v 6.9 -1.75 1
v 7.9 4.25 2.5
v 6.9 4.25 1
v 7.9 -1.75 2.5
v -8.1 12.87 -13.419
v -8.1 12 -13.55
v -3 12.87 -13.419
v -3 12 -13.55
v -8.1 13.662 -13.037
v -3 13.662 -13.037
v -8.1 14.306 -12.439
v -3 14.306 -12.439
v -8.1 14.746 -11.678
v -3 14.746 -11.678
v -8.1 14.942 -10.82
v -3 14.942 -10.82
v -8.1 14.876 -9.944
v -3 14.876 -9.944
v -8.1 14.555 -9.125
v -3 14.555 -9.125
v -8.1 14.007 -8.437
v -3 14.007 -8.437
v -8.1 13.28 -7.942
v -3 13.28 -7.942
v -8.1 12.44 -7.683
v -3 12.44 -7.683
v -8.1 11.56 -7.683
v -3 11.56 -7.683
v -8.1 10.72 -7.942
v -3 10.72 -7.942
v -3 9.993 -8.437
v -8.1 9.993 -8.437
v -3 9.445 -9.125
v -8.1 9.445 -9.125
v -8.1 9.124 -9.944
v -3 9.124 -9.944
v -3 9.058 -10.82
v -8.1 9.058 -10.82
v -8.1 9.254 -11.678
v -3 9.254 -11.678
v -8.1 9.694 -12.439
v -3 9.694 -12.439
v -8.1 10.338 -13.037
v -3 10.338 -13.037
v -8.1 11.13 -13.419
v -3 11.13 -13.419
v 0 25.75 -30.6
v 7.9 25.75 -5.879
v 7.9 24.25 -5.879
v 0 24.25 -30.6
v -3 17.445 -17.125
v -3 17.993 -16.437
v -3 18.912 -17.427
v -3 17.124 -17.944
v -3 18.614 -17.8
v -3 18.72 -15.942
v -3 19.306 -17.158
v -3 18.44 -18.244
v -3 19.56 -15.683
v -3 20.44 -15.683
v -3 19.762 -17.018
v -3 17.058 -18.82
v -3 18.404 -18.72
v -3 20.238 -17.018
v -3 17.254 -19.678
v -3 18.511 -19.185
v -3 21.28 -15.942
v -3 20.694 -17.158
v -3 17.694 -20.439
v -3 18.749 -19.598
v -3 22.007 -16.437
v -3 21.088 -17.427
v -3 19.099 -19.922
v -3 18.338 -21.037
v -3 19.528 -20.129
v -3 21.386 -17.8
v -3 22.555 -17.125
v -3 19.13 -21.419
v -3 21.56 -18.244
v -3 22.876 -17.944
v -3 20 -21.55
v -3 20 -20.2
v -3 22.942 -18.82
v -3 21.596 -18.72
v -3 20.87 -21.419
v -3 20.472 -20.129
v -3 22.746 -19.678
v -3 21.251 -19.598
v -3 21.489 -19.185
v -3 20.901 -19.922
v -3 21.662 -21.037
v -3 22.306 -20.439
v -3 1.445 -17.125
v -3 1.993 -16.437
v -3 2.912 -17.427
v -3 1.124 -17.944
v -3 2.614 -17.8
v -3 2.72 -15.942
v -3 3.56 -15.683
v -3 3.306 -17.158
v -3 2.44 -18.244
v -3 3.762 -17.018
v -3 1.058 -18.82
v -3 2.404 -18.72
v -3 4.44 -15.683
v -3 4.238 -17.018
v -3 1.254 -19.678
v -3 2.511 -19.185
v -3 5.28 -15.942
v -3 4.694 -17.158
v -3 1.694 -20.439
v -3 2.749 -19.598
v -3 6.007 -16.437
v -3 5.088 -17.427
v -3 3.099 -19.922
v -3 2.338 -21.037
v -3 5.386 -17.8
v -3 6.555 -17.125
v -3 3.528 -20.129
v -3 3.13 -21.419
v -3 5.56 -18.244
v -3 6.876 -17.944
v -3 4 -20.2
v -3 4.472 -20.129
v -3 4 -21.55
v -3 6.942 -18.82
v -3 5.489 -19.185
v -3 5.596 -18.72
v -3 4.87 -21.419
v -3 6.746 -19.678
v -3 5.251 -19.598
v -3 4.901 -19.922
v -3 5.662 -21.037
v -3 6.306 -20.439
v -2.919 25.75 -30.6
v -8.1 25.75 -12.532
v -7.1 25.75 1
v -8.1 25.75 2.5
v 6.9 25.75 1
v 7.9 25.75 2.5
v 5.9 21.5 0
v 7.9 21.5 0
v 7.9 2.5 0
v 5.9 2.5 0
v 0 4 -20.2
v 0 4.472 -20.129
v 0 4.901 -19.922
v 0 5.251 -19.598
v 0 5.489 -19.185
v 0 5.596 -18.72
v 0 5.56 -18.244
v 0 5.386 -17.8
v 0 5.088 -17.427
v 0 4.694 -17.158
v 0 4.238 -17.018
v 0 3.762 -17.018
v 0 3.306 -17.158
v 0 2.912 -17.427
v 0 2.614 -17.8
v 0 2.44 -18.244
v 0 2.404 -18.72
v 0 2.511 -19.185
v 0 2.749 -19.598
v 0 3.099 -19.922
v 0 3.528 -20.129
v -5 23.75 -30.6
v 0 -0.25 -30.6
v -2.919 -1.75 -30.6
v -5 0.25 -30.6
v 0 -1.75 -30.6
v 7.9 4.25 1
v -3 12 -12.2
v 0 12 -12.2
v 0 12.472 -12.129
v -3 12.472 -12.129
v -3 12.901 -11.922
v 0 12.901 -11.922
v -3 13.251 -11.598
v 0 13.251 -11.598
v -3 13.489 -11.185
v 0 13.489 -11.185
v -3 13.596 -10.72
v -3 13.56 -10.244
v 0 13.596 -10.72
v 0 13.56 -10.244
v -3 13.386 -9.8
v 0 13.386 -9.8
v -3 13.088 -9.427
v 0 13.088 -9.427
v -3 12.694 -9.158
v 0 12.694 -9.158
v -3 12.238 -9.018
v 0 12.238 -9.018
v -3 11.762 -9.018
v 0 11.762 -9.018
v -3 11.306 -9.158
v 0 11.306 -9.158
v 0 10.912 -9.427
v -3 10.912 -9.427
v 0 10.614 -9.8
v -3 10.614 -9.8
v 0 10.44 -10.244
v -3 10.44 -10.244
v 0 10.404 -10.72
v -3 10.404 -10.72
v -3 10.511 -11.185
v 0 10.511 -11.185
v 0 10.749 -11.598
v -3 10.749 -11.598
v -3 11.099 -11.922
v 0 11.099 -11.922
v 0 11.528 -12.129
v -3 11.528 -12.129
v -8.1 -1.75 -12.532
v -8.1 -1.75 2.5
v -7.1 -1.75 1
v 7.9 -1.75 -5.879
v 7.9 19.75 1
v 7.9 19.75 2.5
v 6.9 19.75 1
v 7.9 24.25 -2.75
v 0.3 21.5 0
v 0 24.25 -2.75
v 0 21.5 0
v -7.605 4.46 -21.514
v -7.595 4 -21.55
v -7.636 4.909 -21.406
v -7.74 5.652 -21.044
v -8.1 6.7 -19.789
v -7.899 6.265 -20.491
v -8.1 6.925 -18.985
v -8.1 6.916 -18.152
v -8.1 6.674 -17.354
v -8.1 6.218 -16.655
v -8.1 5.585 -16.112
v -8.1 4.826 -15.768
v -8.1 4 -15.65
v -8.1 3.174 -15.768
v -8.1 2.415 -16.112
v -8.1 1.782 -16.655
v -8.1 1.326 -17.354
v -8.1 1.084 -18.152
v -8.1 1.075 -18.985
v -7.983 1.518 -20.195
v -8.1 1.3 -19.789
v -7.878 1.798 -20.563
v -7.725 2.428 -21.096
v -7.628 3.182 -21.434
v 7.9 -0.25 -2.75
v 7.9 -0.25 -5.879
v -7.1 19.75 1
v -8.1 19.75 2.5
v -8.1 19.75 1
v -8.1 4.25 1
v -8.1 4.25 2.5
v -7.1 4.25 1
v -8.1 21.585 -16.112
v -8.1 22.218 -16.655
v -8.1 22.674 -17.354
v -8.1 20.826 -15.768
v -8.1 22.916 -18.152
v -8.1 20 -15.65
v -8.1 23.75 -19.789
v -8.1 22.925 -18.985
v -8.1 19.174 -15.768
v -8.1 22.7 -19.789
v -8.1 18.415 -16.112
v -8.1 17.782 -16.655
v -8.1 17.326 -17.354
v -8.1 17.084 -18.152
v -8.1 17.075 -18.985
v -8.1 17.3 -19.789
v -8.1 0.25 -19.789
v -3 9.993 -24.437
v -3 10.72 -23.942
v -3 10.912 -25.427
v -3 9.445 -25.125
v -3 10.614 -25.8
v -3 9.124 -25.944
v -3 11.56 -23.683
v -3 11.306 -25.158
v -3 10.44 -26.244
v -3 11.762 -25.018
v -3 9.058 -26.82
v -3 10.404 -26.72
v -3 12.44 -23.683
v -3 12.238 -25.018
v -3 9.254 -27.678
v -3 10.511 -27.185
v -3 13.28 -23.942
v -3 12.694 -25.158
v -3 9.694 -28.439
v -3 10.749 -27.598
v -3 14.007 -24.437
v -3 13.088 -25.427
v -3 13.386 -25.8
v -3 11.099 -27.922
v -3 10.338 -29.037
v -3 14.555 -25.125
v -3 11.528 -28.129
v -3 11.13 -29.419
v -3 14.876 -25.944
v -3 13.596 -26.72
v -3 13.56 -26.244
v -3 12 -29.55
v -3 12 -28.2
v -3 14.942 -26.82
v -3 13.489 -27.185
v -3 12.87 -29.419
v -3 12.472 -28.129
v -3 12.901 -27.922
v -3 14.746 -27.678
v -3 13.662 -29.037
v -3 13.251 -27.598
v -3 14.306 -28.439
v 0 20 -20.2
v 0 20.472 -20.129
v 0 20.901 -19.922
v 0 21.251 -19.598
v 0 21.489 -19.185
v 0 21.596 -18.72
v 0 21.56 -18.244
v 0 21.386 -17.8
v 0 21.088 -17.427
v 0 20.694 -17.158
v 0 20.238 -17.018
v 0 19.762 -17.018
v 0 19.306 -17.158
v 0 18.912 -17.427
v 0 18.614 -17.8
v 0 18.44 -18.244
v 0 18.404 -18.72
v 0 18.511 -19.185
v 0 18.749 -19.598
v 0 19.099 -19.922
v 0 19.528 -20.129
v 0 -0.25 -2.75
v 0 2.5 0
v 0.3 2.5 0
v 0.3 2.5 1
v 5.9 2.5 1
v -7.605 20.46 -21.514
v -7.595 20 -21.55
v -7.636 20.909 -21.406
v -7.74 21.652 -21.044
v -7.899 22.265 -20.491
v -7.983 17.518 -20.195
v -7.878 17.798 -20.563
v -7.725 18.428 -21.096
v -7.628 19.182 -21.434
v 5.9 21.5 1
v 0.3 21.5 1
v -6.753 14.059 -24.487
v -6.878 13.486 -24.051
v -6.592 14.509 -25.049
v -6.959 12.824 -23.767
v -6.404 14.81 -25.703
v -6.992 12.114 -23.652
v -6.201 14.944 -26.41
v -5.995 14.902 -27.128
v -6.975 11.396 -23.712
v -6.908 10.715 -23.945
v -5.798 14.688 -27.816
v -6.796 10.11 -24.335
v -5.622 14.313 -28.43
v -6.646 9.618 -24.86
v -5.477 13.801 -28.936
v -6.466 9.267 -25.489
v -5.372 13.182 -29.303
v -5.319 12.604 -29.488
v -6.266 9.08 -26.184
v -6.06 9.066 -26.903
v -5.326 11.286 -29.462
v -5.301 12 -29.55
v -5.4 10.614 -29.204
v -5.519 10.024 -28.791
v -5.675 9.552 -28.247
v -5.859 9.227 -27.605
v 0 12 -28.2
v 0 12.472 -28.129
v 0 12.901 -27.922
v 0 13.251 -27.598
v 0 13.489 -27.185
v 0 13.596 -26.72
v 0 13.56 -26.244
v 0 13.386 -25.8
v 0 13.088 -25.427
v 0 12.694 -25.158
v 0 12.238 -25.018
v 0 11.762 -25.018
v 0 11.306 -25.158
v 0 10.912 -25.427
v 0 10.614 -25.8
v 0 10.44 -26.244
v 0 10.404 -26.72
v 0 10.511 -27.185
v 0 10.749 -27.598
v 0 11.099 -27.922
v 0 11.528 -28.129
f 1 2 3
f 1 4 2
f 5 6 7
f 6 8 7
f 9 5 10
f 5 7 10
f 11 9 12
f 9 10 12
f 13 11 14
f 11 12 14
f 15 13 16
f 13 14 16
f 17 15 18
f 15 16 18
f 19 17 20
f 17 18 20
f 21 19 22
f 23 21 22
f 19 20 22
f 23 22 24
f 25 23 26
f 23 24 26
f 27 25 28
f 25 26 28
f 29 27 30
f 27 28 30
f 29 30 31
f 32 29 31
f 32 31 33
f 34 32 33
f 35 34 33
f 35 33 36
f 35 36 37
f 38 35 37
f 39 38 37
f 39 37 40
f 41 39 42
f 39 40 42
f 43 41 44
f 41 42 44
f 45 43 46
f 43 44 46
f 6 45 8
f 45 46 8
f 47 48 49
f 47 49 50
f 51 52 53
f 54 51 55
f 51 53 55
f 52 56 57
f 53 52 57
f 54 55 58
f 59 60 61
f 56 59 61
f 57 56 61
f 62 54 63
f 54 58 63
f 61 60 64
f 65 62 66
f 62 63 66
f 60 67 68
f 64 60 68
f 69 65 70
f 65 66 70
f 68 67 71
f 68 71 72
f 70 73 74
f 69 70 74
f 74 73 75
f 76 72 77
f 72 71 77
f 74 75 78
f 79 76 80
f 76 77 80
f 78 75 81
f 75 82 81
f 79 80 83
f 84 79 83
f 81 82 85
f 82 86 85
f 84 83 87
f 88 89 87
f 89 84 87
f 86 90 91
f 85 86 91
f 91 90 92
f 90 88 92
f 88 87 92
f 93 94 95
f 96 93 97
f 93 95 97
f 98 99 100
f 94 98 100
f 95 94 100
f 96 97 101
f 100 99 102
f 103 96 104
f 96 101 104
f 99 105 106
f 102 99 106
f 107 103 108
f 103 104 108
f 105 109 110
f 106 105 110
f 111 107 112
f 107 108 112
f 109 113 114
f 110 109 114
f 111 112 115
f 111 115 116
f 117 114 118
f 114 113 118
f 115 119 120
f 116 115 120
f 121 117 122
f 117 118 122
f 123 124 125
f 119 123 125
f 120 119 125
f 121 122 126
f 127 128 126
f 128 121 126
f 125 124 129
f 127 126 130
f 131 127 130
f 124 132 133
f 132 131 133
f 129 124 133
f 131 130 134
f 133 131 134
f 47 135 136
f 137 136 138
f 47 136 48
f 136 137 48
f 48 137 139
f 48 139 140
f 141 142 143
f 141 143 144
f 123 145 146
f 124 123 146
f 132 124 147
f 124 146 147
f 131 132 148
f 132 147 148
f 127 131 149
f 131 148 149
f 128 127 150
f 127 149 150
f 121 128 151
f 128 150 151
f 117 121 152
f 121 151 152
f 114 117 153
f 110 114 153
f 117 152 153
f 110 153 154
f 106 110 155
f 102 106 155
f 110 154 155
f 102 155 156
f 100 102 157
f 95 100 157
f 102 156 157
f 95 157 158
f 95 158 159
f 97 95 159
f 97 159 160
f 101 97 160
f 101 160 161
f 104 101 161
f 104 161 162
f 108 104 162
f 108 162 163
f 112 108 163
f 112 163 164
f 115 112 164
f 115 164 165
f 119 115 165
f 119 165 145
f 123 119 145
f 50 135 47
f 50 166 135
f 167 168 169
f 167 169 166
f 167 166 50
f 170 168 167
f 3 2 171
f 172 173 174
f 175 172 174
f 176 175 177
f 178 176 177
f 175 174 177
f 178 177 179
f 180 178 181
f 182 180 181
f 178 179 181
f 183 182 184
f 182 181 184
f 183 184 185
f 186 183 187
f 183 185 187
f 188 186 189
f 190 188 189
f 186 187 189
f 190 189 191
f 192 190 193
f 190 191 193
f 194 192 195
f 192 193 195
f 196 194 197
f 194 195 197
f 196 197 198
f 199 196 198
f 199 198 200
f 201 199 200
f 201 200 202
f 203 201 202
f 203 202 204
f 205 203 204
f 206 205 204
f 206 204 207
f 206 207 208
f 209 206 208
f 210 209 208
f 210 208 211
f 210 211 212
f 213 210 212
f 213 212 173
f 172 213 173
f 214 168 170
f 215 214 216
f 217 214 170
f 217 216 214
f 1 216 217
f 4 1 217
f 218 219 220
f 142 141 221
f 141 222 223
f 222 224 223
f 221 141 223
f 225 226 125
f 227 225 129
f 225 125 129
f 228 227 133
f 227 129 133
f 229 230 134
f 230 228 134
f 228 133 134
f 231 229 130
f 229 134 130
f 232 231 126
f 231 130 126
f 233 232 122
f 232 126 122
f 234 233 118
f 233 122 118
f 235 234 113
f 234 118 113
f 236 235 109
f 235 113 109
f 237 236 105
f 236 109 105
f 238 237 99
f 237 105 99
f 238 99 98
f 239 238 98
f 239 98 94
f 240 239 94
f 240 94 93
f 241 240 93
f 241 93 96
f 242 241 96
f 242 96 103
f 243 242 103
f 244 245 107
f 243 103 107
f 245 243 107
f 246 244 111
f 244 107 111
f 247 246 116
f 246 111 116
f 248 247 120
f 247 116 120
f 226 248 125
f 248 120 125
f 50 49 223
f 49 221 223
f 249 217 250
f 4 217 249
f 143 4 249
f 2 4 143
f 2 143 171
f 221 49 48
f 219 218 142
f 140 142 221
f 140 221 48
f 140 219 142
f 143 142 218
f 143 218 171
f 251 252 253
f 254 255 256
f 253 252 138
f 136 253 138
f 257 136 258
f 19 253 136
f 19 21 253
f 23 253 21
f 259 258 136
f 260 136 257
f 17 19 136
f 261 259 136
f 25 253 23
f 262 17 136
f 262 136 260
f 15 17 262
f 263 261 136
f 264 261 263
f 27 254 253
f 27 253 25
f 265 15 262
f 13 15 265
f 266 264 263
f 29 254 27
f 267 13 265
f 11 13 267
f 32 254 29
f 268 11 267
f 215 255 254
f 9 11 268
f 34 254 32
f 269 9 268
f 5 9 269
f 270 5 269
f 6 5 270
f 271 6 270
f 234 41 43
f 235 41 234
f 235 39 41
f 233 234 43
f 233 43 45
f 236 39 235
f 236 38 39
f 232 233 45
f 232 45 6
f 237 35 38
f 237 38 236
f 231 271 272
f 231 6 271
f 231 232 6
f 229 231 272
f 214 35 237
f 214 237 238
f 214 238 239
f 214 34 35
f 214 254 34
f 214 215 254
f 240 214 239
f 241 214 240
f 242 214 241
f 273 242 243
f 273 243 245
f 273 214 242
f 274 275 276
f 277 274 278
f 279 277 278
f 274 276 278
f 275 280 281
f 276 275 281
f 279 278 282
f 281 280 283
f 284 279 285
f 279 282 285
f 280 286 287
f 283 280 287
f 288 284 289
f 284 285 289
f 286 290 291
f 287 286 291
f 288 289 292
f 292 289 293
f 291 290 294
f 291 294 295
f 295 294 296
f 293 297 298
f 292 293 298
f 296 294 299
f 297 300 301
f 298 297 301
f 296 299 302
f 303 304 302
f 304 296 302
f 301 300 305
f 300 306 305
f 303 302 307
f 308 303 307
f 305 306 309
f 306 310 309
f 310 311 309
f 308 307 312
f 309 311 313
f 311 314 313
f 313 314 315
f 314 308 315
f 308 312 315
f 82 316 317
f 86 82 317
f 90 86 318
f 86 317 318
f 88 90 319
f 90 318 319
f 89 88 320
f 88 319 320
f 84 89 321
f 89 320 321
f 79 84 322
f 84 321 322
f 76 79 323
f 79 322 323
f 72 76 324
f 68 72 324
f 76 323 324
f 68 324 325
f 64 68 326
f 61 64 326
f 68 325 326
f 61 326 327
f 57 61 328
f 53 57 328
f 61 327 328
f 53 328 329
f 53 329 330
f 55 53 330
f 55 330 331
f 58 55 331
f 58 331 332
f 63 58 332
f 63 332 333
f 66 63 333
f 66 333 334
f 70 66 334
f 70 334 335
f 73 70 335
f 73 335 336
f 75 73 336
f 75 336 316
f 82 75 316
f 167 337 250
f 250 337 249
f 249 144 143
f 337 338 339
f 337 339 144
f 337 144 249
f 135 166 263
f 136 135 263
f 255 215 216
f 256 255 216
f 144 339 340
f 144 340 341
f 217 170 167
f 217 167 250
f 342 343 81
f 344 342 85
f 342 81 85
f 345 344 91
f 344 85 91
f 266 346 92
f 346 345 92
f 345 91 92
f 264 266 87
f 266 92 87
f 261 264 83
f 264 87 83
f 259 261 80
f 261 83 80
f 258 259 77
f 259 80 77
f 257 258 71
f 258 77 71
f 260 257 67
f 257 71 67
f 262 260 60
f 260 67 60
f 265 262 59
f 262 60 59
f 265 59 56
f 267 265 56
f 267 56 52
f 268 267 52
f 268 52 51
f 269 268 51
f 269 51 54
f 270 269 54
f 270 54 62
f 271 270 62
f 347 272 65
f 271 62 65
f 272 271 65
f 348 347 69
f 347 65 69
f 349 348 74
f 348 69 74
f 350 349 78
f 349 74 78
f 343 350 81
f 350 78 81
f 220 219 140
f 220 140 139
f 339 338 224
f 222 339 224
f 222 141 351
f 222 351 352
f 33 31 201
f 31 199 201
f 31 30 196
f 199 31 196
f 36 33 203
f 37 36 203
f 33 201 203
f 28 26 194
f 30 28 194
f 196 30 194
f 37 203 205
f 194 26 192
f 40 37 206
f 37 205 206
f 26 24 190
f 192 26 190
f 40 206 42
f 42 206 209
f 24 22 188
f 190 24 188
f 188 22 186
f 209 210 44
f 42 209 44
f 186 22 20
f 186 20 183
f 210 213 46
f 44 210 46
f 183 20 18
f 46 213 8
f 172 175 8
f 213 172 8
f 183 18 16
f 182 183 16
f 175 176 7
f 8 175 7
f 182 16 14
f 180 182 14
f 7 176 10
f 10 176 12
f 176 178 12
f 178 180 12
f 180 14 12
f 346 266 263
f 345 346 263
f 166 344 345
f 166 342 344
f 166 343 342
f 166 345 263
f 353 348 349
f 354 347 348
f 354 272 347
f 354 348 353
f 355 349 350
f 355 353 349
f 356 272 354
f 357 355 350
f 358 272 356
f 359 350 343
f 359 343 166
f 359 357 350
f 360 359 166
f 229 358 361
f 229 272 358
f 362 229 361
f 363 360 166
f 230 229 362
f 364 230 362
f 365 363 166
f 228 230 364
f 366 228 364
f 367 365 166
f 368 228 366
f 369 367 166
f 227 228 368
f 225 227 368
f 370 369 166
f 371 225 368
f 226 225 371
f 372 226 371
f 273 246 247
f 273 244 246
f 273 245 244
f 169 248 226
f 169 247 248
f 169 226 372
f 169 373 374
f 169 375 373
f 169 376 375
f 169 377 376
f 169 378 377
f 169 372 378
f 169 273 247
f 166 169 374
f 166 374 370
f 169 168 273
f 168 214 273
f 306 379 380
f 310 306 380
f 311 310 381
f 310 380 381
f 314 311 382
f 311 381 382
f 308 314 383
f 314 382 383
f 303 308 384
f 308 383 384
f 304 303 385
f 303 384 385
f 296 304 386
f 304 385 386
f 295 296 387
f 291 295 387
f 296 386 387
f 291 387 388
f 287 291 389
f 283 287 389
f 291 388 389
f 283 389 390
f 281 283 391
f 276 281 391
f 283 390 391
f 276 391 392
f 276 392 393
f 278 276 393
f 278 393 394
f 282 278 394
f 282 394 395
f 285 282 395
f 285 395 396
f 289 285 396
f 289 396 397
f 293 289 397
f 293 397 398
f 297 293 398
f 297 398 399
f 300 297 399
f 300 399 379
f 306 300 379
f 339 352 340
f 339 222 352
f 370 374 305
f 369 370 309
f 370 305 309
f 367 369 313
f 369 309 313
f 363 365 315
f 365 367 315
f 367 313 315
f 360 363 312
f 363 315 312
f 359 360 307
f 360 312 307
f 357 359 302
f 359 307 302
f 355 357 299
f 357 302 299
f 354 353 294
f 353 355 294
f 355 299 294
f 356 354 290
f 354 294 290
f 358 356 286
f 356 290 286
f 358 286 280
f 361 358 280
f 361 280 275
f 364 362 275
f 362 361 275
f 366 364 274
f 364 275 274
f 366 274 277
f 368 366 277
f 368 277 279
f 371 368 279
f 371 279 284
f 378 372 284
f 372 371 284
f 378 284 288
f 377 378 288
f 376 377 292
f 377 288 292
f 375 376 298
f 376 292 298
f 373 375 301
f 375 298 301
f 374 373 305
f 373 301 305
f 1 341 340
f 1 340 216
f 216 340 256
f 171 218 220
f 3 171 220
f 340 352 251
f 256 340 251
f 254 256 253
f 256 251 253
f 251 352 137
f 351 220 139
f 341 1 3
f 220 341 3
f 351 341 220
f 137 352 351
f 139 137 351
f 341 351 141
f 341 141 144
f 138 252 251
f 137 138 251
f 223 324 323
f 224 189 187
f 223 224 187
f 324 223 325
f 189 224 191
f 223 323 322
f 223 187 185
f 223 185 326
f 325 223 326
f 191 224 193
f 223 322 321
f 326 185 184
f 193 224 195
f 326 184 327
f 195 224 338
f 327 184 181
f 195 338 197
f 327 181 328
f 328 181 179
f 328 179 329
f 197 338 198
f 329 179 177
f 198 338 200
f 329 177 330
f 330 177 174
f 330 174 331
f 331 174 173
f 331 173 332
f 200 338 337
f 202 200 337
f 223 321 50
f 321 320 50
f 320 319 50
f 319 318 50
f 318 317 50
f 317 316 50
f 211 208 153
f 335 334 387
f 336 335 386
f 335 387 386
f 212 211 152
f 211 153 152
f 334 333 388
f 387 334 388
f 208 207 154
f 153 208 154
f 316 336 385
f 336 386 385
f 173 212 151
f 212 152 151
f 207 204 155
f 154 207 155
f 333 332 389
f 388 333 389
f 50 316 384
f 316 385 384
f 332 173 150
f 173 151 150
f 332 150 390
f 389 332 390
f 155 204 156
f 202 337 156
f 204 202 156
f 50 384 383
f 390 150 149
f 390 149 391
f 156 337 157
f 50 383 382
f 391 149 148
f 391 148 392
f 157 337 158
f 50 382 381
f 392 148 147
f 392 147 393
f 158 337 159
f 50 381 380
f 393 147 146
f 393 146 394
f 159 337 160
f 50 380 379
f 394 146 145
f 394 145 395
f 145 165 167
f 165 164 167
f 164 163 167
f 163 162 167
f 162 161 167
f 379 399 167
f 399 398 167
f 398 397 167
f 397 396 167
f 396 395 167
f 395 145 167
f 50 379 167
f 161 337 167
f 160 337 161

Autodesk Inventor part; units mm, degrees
ref_plane "YZ Plane" through (0, 0, 0) normal (1, 0, 0) x (0, 1, 0)
sketch "Sketch1" plane through (0, 0, 0) normal (0, 1, 0) x (-1, 0, 0)
  line L0 (0, 0) -> (0, -30.6)
  line L1 (0, -30.6) -> (5, -30.6)
  line L2 (0, 0) -> (13.774, 0)
  line L3 (13.774, 0) -> (5, -30.6)
  line L4 (13.774, 0) -> (13.774, 4)
  line L5 (0, 0) -> (0, 9.5471)
  line L6 (13.774, 4) -> (-10.8744, 4)
  point P0 (0, 4)
  dimension "d0" = 30.6
  dimension "d1" = 5
  dimension "d2" = 13.774
  dimension "d3" = 4
extrude "Extrusion1" add sketch "Sketch1" along normal blind 24
sketch "Sketch2" plane through (0, 0, 4) normal (1, 0, 0) x (0, 0, -1)
  line L0 (34.6, 0) -> (34.6, 24) projected
  line L1 (34.6, 12) -> (30.6, 12)
  line L2 (30.6, 12) -> (14.6, 12)
  line L3 (22.6, 12) -> (22.6, 20)
  line L4 (22.6, 12) -> (22.6, 4)
  circle A0 centre (22.6, 20) radius 1.6
  circle A1 centre (14.6, 12) radius 1.6
  circle A2 centre (22.6, 4) radius 1.6
  circle A3 centre (30.6, 12) radius 1.6
  point P0 (4, 0)
  dimension "d6" = 4
  dimension "d7" = 16
  dimension "d8" = 8
  dimension "d9" = 8
  dimension "d10" = 3.2
  dimension "d11" = 3.2
  dimension "d12" = 3.2
  dimension "d13" = 3.2
extrude "Extrusion2" cut sketch "Sketch2" against normal blind 24
ref_plane "Work Plane1" through (-3, 0, 4) normal (1, 0, 0) x (0, 0, -1)
sketch "Sketch3" plane through (-3, 0, 4) normal (1, 0, 0) x (0, 0, -1)
  circle A0 centre (22.6, 20) radius 1.6 projected
  circle A1 centre (22.6, 20) radius 2.95
  circle A2 centre (14.6, 12) radius 1.6 projected
  circle A3 centre (14.6, 12) radius 2.95
  circle A4 centre (22.6, 4) radius 1.6 projected
  circle A5 centre (22.6, 4) radius 2.95
  circle A6 centre (30.6, 12) radius 1.6 projected
  circle A7 centre (30.6, 12) radius 2.95
  point P0 (4, 0)
  dimension "d17" = 5.9
  dimension "d18" = 5.9
  dimension "d19" = 5.9
  dimension "d20" = 5.9
extrude "Extrusion3" cut sketch "Sketch3" against normal blind 24 contours A0 | A1 | A2 | A3 | A4 | A5 | A6 | A7
sketch "Sketch5" plane through (0, 0, 4) normal (1, 0, 0) x (0, 0, -1)
  line L0 (4, 0) -> (0, 0) projected
  line L1 (34.6, 24) -> (4, 24) projected
  line L2 (0, 0) -> (4, 0)
  line L3 (4, 0) -> (4, 24)
  line L4 (4, 24) -> (0, 24)
  line L5 (0, 24) -> (0, 0)
  line L6 (4, 0) -> (4, 24) projected
  line L7 (4, 24) -> (6.5, 24)
  line L8 (6.5, 24) -> (6.5, 21.5)
  line L9 (6.5, 21.5) -> (4, 21.5)
  line L10 (4, 21.5) -> (4, 24)
  line L11 (4, 0) -> (6.5, 0)
  line L12 (6.5, 0) -> (6.5, 2.5)
  line L13 (6.5, 2.5) -> (4, 2.5)
  line L14 (4, 2.5) -> (4, 0)
  line L15 (4, 2.5) -> (6.5, 0)
  line L16 (4, 21.5) -> (6.5, 24)
  dimension "d40" = 4
  dimension "d41" = 24
  dimension "d44" = 2.5
  dimension "d45" = 2.5
  dimension "d46" = 2.5
  dimension "d47" = 2.5
extrude "Extrusion6" add sketch "Sketch5" along normal blind 8.9 contours L0 L5 L4 L3 | L3 L15 L11 | L3 L1 L16
sketch "Sketch7" plane through (0, 2.5, 0) normal (0, 0, -1) x (-1, 0, 0)
  line L0 (0, 0) -> (-8.9, 0) projected
  line L1 (0, 19) -> (-8.9, 19) projected
  line L2 (0, 0) -> (-5.5, 0)
  line L3 (-5.5, 0) -> (-5.5, 19)
  line L4 (-5.5, 19) -> (0, 19)
  line L5 (0, 19) -> (0, 0)
  line L6 (0, 21.5) -> (0, 19) projected
  line L7 (0, 19) -> (-0.3, 19)
  line L8 (-0.3, 19) -> (-0.3, 0)
  line L9 (-0.3, 0) -> (0, 0)
  line L10 (0, 0) -> (0, 19)
  point P0 (0, -2.5)
  dimension "d55" = 5.5
  dimension "d56" = 0.3
extrude "Extrusion8" cut sketch "Sketch7" against normal blind 30 contours L0 L3 L1 L8
sketch "Sketch9" plane through (-13.774, 0, 0) normal (-1, 0, 0) x (0, 0, 1)
  line L0 (-2.5, 24) -> (-30.6, 24) projected
  line L1 (4, 0) -> (-30.6, 0)
  line L2 (-30.6, 0) -> (-30.6, 24)
  line L3 (-30.6, 24) -> (4, 24)
  line L4 (4, 24) -> (4, 0)
  point P0 (0, 0)
extrude "Extrusion10" cut sketch "Sketch9" against normal blind 5.674
sketch "Sketch10" plane through (8.9, 0, 4) normal (1, 0, 0) x (0, 0, -1)
  line L0 (6.5, 24) -> (0, 24) projected
  line L1 (0, 24) -> (0, 24.25)
  line L2 (0, 24.25) -> (8.0681, 24.25)
  line L3 (4, 21.5) -> (6.5, 24) projected
  line L4 (4, 21.5) -> (7.5355, 25.0355)
  line L5 (4, 21.5) -> (9, 21.5) construction
  line L6 (0, 24) -> (0, 0) projected
  line L7 (6.5, 24) -> (0, 24)
  line L8 (4, 21.5) -> (4, 2.5) projected
  line L9 (4, 12) -> (-3.3365, 12)
  line L10 (6.5, 0) -> (0, 0)
  line L11 (0, 0) -> (0, -0.25)
  line L12 (0, -0.25) -> (8.0681, -0.25)
  line L13 (4, 2.5) -> (6.5, 0)
  line L14 (4, 2.5) -> (7.5355, -1.0355)
  line L15 (4, 2.5) -> (9, 2.5) construction
  line L16 (6.5, 0) -> (0, 0)
  point P0 (4, 0)
  point P1 (6.75, -0.25)
  point P2 (6.75, 24.25)
  dimension "d65" = 0.25
  dimension "d66" = 5
  dimension "d67" = 45
extrude "Extrusion11" add sketch "Sketch10" against normal blind 8.9 contours L0 L1 L2 L4 | L10 L14 L12 L11
ref_plane "Work Plane2" through (0, 12, 0) normal (0, -1, 0) x (1, 0, 0)
sketch "Sketch12" plane through (8.9, -0.25, -2.75) normal (0, -1, 0) x (1, 0, 0)
  line L0 (0, 0) -> (0, 2.75) projected
  line L1 (0, 0) -> (-8.9, 0)
  line L2 (-8.9, 0) -> (-8.9, 6.75)
  line L3 (-8.9, 6.75) -> (0, 6.75)
  line L4 (0, 6.75) -> (0, 0)
  point P0 (-8.9, 2.75)
extrude "Extrusion12" add sketch "Sketch12" along normal blind 1.5
sketch "Sketch13" plane through (0, 0, 0) normal (0, -1, 0) x (1, 0, 0)
  line L0 (0, -30.6) -> (-5, -30.6) projected
  line L1 (0, -2.5) -> (0, 4) projected
  line L2 (-5, -30.6) -> (0, -30.6)
  line L3 (0, -30.6) -> (0, 4)
  line L4 (0, 4) -> (-5, 4)
  line L5 (-5, 4) -> (-5, -30.6)
  line L6 (-8.1, -19.7885) -> (-5, -19.7885)
  line L7 (-5, -19.7885) -> (-5, 4)
  line L8 (-5, 4) -> (-8.1, 4)
  line L9 (-8.1, 4) -> (-8.1, -19.7885)
  line L10 (-5, -30.6) -> (-8.1, -19.7885) projected
  line L11 (-5, -30.6) -> (-8.1, -19.7885)
  point P0 (0, 0)
extrude "Extrusion13" add sketch "Sketch13" along normal blind 1.75
sketch "Sketch14" plane through (8.9, -1.75, -2.75) normal (0, -1, 0) x (1, 0, 0)
  line L0 (-8.9, -27.85) -> (-8.9, 0) projected
  line L1 (0, 0) -> (0, 2.75) projected
  line L2 (-8.9, -27.85) -> (0, 0)
  line L3 (-8.9, -27.85) -> (0, -27.85)
  line L4 (0, -27.85) -> (0, 0)
  line L5 (0, 0) -> (-8.9, 0)
  line L6 (-8.9, 0) -> (-8.9, -27.85)
  point P0 (-8.9, 2.75)
  point P1 (-8.9, 0)
extrude "Extrusion14" add sketch "Sketch14" against normal blind 1.5 contours L0 L5 L2
mirror "Mirror1" about plane through (0, 12, 0) normal (0, -1, 0) of "Extrusion12", "Extrusion13", "Extrusion14"
sketch "Sketch15" plane through (8.9, 0, 4) normal (1, 0, 0) x (0, 0, -1)
  line L0 (22.1903, 31.1847) -> (-2.991, 31.1847)
  line L1 (-2.991, 31.1847) -> (-2.991, -5.1617)
  line L2 (-2.991, -5.1617) -> (22.1903, -5.1617)
  line L3 (22.1903, -5.1617) -> (22.1903, 31.1847)
  point P0 (4, 0)
extrude "Extrusion17" cut sketch "Sketch15" against normal blind 1
sketch "Sketch16" plane through (-8.1, -1.75, 4) normal (0, 0, 1) x (1, 0, 0)
  line L0 (23.1984, -4.3461) -> (-2.2485, -4.3461)
  line L1 (-2.2485, -4.3461) -> (-2.2485, 32.2961)
  line L2 (-2.2485, 32.2961) -> (23.1984, 32.2961)
  line L3 (23.1984, 32.2961) -> (23.1984, -4.3461)
  point P0 (8.1, 1.75)
extrude "Extrusion18" cut sketch "Sketch16" against normal blind 3
sketch "Sketch17" plane through (5.5, 2.5, 0) normal (0, 0, -1) x (-1, 0, 0)
  line L0 (5.2, 0) -> (0, 0) projected
  line L1 (-2.4, 19) -> (-2.4, 0) projected
  line L2 (0, 0) -> (-2.4, 0)
  line L3 (-2.4, 0) -> (-2.4, 19)
  line L4 (-2.4, 19) -> (0, 19)
  line L5 (0, 19) -> (0, 0)
  point P0 (5.5, -2.5)
extrude "Extrusion19" cut sketch "Sketch17" against normal blind 3
sketch "Sketch18" plane through (8.9, -1.75, -2.75) normal (0, -1, 0) x (1, 0, 0)
  line L0 (-8.6, 3.75) -> (-1, 3.75) projected
  line L1 (-1, 3.75) -> (-3, 3.75)
  line L2 (-1, 5.75) -> (-1, 3.75)
  line L3 (-1, 3.75) -> (-2, 3.75)
  line L4 (-2, 3.75) -> (-2, 5.25)
  line L5 (-2, 5.25) -> (-1, 5.25)
  line L6 (-1, 5.25) -> (-1, 3.75)
  line L7 (-1, 5.25) -> (-2, 3.75)
  point P0 (-8.9, 2.75)
  point P1 (-2, 3.75)
  dimension "d97" = 1
  dimension "d98" = 1.5
extrude "Extrusion20" add sketch "Sketch18" against normal blind 27.5 contours L7 L2 L0
sketch "Sketch19" plane through (7.9, 2.5, 1) normal (0, 0, -1) x (-1, 0, 0)
  line L0 (7.6, 19) -> (0, 19) projected
  line L1 (7.6, 0) -> (0, 0) projected
  line L2 (0, 19) -> (2, 19)
  line L3 (2, 19) -> (2, 0)
  line L4 (2, 0) -> (0, 0)
  line L5 (0, 0) -> (0, 19)
  point P0 (7.9, -2.5)
  dimension "d101" = 2
extrude "Extrusion21" add sketch "Sketch19" along normal blind 1
sketch "Sketch20" plane through (8.9, -1.75, -2.75) normal (0, -1, 0) x (1, 0, 0)
  line L0 (-1, 5.25) -> (-1, -3.1292) projected
  line L1 (-1, 5.25) -> (-17, 5.25)
  line L2 (-17, 5.25) -> (-17, 0.25)
  line L3 (-17, 5.25) -> (-16, 5.25)
  line L4 (-16, 5.25) -> (-16, 3.75)
  line L5 (-16, 3.75) -> (-17, 3.75)
  line L6 (-17, 3.75) -> (-17, 5.25)
  line L7 (-17, 5.25) -> (-16, 3.75)
  point P0 (-8.9, 2.75)
  dimension "d107" = 16
  dimension "d108" = 5
  dimension "d109" = 1
  dimension "d110" = 1.5
extrude "Extrusion22" add sketch "Sketch20" against normal blind 27.5 contours L7 L5 L2
sketch "Sketch21" plane through (7.9, 0, 4) normal (1, 0, 0) x (0, 0, -1)
  line L0 (1.5, -1.75) -> (1.5, 25.75) projected
  line L1 (1.5, -1.75) -> (1.5, 4.25)
  line L2 (1.5, 25.75) -> (9.8792, 25.75) projected
  line L3 (1.5, 25.75) -> (1.5, 19.75)
  line L4 (1.5, 19.75) -> (3, 19.75)
  line L5 (3, 21.5) -> (3, 2.5) projected
  line L6 (1.5, 19.75) -> (1.5, 4.25)
  line L7 (1.5, 4.25) -> (3, 4.25)
  line L8 (3, 4.25) -> (3, 19.75)
  point P0 (4, 0)
  dimension "d116" = 6
  dimension "d117" = 6
extrude "Extrusion23" cut sketch "Sketch21" against normal blind 60
chamfer "Chamfer9" distance 2 angle 45 2 edges at (-6.55, 25.75, -25.1943) (-6.55, -1.75, -25.1943)
properties part number "finger_v1"
